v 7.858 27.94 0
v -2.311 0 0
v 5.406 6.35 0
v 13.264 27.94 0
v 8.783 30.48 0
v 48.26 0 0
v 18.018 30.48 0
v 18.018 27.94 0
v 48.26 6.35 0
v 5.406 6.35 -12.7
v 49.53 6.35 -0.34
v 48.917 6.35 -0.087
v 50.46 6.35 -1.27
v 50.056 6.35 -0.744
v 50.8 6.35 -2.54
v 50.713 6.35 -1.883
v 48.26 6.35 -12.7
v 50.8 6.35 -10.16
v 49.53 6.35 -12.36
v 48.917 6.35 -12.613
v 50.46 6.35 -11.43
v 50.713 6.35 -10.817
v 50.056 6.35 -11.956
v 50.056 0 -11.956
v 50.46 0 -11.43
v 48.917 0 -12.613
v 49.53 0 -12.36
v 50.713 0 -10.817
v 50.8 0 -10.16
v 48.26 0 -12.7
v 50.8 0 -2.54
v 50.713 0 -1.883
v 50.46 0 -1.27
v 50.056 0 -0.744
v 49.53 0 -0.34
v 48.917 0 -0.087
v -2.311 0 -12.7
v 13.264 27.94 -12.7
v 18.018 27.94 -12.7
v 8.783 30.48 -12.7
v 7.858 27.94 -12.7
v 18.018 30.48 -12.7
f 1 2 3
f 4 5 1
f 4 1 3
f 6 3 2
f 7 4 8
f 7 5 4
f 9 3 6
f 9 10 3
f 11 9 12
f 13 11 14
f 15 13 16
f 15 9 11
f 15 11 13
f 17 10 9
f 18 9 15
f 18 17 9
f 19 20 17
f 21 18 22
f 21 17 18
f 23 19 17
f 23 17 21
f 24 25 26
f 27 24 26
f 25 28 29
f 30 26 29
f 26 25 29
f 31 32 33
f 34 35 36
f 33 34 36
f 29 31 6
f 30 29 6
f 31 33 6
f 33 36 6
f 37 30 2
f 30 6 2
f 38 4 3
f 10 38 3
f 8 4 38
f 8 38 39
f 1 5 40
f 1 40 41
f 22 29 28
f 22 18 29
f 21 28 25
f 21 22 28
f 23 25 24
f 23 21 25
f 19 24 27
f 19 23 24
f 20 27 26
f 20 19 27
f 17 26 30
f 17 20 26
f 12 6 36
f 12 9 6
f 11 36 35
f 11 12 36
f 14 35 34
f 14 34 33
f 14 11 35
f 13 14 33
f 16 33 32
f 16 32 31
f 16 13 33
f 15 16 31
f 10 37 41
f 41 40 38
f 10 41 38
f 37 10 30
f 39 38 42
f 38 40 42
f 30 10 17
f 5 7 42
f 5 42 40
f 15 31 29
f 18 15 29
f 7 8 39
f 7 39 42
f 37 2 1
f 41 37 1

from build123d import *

# Parameters (mm, degrees)
SKETCH1_W           = 50.8
SKETCH1_H           = 12.7
BOSS_EXTRUDE1_DEPTH = 6.35
FILLET1_R           = 2.54
BOSS_EXTRUDE2_DEPTH = 12.7
BOSS_EXTRUDE3_DEPTH = 12.7


with BuildPart() as part:
    # Sketch1 → Boss-Extrude1 (new body)
    with BuildSketch(Plane(origin=(0, 0, 0), x_dir=(1, 0, 0), z_dir=(0, 1, 0))):
        with Locations((25.4, 6.35)):
            Rectangle(SKETCH1_W, SKETCH1_H)
    extrude(amount=BOSS_EXTRUDE1_DEPTH)

    # Fillet1
    fillet1_edges = [part.edges().sort_by_distance(p)[0] for p in [
        (50.8, 3.175, -12.7),
        (50.8, 3.175, 0),
    ]]
    fillet(fillet1_edges, radius=FILLET1_R)

    # Sketch3 → Boss-Extrude2 (add)
    with BuildSketch(Plane.XY):
        Polygon((-2.311210988, 0), (7.858117358, 27.94), (13.264140442, 27.94), (3.094812097, 0), align=None)
    extrude(amount=-BOSS_EXTRUDE2_DEPTH)

    # Sketch4 → Boss-Extrude3 (add)
    with BuildSketch(Plane.XY):
        Polygon((7.858117358, 27.94), (18.018117358, 27.94), (18.018117358, 30.48), (8.782601753, 30.48), align=None)
    extrude(amount=-BOSS_EXTRUDE3_DEPTH)


solid = part.part
